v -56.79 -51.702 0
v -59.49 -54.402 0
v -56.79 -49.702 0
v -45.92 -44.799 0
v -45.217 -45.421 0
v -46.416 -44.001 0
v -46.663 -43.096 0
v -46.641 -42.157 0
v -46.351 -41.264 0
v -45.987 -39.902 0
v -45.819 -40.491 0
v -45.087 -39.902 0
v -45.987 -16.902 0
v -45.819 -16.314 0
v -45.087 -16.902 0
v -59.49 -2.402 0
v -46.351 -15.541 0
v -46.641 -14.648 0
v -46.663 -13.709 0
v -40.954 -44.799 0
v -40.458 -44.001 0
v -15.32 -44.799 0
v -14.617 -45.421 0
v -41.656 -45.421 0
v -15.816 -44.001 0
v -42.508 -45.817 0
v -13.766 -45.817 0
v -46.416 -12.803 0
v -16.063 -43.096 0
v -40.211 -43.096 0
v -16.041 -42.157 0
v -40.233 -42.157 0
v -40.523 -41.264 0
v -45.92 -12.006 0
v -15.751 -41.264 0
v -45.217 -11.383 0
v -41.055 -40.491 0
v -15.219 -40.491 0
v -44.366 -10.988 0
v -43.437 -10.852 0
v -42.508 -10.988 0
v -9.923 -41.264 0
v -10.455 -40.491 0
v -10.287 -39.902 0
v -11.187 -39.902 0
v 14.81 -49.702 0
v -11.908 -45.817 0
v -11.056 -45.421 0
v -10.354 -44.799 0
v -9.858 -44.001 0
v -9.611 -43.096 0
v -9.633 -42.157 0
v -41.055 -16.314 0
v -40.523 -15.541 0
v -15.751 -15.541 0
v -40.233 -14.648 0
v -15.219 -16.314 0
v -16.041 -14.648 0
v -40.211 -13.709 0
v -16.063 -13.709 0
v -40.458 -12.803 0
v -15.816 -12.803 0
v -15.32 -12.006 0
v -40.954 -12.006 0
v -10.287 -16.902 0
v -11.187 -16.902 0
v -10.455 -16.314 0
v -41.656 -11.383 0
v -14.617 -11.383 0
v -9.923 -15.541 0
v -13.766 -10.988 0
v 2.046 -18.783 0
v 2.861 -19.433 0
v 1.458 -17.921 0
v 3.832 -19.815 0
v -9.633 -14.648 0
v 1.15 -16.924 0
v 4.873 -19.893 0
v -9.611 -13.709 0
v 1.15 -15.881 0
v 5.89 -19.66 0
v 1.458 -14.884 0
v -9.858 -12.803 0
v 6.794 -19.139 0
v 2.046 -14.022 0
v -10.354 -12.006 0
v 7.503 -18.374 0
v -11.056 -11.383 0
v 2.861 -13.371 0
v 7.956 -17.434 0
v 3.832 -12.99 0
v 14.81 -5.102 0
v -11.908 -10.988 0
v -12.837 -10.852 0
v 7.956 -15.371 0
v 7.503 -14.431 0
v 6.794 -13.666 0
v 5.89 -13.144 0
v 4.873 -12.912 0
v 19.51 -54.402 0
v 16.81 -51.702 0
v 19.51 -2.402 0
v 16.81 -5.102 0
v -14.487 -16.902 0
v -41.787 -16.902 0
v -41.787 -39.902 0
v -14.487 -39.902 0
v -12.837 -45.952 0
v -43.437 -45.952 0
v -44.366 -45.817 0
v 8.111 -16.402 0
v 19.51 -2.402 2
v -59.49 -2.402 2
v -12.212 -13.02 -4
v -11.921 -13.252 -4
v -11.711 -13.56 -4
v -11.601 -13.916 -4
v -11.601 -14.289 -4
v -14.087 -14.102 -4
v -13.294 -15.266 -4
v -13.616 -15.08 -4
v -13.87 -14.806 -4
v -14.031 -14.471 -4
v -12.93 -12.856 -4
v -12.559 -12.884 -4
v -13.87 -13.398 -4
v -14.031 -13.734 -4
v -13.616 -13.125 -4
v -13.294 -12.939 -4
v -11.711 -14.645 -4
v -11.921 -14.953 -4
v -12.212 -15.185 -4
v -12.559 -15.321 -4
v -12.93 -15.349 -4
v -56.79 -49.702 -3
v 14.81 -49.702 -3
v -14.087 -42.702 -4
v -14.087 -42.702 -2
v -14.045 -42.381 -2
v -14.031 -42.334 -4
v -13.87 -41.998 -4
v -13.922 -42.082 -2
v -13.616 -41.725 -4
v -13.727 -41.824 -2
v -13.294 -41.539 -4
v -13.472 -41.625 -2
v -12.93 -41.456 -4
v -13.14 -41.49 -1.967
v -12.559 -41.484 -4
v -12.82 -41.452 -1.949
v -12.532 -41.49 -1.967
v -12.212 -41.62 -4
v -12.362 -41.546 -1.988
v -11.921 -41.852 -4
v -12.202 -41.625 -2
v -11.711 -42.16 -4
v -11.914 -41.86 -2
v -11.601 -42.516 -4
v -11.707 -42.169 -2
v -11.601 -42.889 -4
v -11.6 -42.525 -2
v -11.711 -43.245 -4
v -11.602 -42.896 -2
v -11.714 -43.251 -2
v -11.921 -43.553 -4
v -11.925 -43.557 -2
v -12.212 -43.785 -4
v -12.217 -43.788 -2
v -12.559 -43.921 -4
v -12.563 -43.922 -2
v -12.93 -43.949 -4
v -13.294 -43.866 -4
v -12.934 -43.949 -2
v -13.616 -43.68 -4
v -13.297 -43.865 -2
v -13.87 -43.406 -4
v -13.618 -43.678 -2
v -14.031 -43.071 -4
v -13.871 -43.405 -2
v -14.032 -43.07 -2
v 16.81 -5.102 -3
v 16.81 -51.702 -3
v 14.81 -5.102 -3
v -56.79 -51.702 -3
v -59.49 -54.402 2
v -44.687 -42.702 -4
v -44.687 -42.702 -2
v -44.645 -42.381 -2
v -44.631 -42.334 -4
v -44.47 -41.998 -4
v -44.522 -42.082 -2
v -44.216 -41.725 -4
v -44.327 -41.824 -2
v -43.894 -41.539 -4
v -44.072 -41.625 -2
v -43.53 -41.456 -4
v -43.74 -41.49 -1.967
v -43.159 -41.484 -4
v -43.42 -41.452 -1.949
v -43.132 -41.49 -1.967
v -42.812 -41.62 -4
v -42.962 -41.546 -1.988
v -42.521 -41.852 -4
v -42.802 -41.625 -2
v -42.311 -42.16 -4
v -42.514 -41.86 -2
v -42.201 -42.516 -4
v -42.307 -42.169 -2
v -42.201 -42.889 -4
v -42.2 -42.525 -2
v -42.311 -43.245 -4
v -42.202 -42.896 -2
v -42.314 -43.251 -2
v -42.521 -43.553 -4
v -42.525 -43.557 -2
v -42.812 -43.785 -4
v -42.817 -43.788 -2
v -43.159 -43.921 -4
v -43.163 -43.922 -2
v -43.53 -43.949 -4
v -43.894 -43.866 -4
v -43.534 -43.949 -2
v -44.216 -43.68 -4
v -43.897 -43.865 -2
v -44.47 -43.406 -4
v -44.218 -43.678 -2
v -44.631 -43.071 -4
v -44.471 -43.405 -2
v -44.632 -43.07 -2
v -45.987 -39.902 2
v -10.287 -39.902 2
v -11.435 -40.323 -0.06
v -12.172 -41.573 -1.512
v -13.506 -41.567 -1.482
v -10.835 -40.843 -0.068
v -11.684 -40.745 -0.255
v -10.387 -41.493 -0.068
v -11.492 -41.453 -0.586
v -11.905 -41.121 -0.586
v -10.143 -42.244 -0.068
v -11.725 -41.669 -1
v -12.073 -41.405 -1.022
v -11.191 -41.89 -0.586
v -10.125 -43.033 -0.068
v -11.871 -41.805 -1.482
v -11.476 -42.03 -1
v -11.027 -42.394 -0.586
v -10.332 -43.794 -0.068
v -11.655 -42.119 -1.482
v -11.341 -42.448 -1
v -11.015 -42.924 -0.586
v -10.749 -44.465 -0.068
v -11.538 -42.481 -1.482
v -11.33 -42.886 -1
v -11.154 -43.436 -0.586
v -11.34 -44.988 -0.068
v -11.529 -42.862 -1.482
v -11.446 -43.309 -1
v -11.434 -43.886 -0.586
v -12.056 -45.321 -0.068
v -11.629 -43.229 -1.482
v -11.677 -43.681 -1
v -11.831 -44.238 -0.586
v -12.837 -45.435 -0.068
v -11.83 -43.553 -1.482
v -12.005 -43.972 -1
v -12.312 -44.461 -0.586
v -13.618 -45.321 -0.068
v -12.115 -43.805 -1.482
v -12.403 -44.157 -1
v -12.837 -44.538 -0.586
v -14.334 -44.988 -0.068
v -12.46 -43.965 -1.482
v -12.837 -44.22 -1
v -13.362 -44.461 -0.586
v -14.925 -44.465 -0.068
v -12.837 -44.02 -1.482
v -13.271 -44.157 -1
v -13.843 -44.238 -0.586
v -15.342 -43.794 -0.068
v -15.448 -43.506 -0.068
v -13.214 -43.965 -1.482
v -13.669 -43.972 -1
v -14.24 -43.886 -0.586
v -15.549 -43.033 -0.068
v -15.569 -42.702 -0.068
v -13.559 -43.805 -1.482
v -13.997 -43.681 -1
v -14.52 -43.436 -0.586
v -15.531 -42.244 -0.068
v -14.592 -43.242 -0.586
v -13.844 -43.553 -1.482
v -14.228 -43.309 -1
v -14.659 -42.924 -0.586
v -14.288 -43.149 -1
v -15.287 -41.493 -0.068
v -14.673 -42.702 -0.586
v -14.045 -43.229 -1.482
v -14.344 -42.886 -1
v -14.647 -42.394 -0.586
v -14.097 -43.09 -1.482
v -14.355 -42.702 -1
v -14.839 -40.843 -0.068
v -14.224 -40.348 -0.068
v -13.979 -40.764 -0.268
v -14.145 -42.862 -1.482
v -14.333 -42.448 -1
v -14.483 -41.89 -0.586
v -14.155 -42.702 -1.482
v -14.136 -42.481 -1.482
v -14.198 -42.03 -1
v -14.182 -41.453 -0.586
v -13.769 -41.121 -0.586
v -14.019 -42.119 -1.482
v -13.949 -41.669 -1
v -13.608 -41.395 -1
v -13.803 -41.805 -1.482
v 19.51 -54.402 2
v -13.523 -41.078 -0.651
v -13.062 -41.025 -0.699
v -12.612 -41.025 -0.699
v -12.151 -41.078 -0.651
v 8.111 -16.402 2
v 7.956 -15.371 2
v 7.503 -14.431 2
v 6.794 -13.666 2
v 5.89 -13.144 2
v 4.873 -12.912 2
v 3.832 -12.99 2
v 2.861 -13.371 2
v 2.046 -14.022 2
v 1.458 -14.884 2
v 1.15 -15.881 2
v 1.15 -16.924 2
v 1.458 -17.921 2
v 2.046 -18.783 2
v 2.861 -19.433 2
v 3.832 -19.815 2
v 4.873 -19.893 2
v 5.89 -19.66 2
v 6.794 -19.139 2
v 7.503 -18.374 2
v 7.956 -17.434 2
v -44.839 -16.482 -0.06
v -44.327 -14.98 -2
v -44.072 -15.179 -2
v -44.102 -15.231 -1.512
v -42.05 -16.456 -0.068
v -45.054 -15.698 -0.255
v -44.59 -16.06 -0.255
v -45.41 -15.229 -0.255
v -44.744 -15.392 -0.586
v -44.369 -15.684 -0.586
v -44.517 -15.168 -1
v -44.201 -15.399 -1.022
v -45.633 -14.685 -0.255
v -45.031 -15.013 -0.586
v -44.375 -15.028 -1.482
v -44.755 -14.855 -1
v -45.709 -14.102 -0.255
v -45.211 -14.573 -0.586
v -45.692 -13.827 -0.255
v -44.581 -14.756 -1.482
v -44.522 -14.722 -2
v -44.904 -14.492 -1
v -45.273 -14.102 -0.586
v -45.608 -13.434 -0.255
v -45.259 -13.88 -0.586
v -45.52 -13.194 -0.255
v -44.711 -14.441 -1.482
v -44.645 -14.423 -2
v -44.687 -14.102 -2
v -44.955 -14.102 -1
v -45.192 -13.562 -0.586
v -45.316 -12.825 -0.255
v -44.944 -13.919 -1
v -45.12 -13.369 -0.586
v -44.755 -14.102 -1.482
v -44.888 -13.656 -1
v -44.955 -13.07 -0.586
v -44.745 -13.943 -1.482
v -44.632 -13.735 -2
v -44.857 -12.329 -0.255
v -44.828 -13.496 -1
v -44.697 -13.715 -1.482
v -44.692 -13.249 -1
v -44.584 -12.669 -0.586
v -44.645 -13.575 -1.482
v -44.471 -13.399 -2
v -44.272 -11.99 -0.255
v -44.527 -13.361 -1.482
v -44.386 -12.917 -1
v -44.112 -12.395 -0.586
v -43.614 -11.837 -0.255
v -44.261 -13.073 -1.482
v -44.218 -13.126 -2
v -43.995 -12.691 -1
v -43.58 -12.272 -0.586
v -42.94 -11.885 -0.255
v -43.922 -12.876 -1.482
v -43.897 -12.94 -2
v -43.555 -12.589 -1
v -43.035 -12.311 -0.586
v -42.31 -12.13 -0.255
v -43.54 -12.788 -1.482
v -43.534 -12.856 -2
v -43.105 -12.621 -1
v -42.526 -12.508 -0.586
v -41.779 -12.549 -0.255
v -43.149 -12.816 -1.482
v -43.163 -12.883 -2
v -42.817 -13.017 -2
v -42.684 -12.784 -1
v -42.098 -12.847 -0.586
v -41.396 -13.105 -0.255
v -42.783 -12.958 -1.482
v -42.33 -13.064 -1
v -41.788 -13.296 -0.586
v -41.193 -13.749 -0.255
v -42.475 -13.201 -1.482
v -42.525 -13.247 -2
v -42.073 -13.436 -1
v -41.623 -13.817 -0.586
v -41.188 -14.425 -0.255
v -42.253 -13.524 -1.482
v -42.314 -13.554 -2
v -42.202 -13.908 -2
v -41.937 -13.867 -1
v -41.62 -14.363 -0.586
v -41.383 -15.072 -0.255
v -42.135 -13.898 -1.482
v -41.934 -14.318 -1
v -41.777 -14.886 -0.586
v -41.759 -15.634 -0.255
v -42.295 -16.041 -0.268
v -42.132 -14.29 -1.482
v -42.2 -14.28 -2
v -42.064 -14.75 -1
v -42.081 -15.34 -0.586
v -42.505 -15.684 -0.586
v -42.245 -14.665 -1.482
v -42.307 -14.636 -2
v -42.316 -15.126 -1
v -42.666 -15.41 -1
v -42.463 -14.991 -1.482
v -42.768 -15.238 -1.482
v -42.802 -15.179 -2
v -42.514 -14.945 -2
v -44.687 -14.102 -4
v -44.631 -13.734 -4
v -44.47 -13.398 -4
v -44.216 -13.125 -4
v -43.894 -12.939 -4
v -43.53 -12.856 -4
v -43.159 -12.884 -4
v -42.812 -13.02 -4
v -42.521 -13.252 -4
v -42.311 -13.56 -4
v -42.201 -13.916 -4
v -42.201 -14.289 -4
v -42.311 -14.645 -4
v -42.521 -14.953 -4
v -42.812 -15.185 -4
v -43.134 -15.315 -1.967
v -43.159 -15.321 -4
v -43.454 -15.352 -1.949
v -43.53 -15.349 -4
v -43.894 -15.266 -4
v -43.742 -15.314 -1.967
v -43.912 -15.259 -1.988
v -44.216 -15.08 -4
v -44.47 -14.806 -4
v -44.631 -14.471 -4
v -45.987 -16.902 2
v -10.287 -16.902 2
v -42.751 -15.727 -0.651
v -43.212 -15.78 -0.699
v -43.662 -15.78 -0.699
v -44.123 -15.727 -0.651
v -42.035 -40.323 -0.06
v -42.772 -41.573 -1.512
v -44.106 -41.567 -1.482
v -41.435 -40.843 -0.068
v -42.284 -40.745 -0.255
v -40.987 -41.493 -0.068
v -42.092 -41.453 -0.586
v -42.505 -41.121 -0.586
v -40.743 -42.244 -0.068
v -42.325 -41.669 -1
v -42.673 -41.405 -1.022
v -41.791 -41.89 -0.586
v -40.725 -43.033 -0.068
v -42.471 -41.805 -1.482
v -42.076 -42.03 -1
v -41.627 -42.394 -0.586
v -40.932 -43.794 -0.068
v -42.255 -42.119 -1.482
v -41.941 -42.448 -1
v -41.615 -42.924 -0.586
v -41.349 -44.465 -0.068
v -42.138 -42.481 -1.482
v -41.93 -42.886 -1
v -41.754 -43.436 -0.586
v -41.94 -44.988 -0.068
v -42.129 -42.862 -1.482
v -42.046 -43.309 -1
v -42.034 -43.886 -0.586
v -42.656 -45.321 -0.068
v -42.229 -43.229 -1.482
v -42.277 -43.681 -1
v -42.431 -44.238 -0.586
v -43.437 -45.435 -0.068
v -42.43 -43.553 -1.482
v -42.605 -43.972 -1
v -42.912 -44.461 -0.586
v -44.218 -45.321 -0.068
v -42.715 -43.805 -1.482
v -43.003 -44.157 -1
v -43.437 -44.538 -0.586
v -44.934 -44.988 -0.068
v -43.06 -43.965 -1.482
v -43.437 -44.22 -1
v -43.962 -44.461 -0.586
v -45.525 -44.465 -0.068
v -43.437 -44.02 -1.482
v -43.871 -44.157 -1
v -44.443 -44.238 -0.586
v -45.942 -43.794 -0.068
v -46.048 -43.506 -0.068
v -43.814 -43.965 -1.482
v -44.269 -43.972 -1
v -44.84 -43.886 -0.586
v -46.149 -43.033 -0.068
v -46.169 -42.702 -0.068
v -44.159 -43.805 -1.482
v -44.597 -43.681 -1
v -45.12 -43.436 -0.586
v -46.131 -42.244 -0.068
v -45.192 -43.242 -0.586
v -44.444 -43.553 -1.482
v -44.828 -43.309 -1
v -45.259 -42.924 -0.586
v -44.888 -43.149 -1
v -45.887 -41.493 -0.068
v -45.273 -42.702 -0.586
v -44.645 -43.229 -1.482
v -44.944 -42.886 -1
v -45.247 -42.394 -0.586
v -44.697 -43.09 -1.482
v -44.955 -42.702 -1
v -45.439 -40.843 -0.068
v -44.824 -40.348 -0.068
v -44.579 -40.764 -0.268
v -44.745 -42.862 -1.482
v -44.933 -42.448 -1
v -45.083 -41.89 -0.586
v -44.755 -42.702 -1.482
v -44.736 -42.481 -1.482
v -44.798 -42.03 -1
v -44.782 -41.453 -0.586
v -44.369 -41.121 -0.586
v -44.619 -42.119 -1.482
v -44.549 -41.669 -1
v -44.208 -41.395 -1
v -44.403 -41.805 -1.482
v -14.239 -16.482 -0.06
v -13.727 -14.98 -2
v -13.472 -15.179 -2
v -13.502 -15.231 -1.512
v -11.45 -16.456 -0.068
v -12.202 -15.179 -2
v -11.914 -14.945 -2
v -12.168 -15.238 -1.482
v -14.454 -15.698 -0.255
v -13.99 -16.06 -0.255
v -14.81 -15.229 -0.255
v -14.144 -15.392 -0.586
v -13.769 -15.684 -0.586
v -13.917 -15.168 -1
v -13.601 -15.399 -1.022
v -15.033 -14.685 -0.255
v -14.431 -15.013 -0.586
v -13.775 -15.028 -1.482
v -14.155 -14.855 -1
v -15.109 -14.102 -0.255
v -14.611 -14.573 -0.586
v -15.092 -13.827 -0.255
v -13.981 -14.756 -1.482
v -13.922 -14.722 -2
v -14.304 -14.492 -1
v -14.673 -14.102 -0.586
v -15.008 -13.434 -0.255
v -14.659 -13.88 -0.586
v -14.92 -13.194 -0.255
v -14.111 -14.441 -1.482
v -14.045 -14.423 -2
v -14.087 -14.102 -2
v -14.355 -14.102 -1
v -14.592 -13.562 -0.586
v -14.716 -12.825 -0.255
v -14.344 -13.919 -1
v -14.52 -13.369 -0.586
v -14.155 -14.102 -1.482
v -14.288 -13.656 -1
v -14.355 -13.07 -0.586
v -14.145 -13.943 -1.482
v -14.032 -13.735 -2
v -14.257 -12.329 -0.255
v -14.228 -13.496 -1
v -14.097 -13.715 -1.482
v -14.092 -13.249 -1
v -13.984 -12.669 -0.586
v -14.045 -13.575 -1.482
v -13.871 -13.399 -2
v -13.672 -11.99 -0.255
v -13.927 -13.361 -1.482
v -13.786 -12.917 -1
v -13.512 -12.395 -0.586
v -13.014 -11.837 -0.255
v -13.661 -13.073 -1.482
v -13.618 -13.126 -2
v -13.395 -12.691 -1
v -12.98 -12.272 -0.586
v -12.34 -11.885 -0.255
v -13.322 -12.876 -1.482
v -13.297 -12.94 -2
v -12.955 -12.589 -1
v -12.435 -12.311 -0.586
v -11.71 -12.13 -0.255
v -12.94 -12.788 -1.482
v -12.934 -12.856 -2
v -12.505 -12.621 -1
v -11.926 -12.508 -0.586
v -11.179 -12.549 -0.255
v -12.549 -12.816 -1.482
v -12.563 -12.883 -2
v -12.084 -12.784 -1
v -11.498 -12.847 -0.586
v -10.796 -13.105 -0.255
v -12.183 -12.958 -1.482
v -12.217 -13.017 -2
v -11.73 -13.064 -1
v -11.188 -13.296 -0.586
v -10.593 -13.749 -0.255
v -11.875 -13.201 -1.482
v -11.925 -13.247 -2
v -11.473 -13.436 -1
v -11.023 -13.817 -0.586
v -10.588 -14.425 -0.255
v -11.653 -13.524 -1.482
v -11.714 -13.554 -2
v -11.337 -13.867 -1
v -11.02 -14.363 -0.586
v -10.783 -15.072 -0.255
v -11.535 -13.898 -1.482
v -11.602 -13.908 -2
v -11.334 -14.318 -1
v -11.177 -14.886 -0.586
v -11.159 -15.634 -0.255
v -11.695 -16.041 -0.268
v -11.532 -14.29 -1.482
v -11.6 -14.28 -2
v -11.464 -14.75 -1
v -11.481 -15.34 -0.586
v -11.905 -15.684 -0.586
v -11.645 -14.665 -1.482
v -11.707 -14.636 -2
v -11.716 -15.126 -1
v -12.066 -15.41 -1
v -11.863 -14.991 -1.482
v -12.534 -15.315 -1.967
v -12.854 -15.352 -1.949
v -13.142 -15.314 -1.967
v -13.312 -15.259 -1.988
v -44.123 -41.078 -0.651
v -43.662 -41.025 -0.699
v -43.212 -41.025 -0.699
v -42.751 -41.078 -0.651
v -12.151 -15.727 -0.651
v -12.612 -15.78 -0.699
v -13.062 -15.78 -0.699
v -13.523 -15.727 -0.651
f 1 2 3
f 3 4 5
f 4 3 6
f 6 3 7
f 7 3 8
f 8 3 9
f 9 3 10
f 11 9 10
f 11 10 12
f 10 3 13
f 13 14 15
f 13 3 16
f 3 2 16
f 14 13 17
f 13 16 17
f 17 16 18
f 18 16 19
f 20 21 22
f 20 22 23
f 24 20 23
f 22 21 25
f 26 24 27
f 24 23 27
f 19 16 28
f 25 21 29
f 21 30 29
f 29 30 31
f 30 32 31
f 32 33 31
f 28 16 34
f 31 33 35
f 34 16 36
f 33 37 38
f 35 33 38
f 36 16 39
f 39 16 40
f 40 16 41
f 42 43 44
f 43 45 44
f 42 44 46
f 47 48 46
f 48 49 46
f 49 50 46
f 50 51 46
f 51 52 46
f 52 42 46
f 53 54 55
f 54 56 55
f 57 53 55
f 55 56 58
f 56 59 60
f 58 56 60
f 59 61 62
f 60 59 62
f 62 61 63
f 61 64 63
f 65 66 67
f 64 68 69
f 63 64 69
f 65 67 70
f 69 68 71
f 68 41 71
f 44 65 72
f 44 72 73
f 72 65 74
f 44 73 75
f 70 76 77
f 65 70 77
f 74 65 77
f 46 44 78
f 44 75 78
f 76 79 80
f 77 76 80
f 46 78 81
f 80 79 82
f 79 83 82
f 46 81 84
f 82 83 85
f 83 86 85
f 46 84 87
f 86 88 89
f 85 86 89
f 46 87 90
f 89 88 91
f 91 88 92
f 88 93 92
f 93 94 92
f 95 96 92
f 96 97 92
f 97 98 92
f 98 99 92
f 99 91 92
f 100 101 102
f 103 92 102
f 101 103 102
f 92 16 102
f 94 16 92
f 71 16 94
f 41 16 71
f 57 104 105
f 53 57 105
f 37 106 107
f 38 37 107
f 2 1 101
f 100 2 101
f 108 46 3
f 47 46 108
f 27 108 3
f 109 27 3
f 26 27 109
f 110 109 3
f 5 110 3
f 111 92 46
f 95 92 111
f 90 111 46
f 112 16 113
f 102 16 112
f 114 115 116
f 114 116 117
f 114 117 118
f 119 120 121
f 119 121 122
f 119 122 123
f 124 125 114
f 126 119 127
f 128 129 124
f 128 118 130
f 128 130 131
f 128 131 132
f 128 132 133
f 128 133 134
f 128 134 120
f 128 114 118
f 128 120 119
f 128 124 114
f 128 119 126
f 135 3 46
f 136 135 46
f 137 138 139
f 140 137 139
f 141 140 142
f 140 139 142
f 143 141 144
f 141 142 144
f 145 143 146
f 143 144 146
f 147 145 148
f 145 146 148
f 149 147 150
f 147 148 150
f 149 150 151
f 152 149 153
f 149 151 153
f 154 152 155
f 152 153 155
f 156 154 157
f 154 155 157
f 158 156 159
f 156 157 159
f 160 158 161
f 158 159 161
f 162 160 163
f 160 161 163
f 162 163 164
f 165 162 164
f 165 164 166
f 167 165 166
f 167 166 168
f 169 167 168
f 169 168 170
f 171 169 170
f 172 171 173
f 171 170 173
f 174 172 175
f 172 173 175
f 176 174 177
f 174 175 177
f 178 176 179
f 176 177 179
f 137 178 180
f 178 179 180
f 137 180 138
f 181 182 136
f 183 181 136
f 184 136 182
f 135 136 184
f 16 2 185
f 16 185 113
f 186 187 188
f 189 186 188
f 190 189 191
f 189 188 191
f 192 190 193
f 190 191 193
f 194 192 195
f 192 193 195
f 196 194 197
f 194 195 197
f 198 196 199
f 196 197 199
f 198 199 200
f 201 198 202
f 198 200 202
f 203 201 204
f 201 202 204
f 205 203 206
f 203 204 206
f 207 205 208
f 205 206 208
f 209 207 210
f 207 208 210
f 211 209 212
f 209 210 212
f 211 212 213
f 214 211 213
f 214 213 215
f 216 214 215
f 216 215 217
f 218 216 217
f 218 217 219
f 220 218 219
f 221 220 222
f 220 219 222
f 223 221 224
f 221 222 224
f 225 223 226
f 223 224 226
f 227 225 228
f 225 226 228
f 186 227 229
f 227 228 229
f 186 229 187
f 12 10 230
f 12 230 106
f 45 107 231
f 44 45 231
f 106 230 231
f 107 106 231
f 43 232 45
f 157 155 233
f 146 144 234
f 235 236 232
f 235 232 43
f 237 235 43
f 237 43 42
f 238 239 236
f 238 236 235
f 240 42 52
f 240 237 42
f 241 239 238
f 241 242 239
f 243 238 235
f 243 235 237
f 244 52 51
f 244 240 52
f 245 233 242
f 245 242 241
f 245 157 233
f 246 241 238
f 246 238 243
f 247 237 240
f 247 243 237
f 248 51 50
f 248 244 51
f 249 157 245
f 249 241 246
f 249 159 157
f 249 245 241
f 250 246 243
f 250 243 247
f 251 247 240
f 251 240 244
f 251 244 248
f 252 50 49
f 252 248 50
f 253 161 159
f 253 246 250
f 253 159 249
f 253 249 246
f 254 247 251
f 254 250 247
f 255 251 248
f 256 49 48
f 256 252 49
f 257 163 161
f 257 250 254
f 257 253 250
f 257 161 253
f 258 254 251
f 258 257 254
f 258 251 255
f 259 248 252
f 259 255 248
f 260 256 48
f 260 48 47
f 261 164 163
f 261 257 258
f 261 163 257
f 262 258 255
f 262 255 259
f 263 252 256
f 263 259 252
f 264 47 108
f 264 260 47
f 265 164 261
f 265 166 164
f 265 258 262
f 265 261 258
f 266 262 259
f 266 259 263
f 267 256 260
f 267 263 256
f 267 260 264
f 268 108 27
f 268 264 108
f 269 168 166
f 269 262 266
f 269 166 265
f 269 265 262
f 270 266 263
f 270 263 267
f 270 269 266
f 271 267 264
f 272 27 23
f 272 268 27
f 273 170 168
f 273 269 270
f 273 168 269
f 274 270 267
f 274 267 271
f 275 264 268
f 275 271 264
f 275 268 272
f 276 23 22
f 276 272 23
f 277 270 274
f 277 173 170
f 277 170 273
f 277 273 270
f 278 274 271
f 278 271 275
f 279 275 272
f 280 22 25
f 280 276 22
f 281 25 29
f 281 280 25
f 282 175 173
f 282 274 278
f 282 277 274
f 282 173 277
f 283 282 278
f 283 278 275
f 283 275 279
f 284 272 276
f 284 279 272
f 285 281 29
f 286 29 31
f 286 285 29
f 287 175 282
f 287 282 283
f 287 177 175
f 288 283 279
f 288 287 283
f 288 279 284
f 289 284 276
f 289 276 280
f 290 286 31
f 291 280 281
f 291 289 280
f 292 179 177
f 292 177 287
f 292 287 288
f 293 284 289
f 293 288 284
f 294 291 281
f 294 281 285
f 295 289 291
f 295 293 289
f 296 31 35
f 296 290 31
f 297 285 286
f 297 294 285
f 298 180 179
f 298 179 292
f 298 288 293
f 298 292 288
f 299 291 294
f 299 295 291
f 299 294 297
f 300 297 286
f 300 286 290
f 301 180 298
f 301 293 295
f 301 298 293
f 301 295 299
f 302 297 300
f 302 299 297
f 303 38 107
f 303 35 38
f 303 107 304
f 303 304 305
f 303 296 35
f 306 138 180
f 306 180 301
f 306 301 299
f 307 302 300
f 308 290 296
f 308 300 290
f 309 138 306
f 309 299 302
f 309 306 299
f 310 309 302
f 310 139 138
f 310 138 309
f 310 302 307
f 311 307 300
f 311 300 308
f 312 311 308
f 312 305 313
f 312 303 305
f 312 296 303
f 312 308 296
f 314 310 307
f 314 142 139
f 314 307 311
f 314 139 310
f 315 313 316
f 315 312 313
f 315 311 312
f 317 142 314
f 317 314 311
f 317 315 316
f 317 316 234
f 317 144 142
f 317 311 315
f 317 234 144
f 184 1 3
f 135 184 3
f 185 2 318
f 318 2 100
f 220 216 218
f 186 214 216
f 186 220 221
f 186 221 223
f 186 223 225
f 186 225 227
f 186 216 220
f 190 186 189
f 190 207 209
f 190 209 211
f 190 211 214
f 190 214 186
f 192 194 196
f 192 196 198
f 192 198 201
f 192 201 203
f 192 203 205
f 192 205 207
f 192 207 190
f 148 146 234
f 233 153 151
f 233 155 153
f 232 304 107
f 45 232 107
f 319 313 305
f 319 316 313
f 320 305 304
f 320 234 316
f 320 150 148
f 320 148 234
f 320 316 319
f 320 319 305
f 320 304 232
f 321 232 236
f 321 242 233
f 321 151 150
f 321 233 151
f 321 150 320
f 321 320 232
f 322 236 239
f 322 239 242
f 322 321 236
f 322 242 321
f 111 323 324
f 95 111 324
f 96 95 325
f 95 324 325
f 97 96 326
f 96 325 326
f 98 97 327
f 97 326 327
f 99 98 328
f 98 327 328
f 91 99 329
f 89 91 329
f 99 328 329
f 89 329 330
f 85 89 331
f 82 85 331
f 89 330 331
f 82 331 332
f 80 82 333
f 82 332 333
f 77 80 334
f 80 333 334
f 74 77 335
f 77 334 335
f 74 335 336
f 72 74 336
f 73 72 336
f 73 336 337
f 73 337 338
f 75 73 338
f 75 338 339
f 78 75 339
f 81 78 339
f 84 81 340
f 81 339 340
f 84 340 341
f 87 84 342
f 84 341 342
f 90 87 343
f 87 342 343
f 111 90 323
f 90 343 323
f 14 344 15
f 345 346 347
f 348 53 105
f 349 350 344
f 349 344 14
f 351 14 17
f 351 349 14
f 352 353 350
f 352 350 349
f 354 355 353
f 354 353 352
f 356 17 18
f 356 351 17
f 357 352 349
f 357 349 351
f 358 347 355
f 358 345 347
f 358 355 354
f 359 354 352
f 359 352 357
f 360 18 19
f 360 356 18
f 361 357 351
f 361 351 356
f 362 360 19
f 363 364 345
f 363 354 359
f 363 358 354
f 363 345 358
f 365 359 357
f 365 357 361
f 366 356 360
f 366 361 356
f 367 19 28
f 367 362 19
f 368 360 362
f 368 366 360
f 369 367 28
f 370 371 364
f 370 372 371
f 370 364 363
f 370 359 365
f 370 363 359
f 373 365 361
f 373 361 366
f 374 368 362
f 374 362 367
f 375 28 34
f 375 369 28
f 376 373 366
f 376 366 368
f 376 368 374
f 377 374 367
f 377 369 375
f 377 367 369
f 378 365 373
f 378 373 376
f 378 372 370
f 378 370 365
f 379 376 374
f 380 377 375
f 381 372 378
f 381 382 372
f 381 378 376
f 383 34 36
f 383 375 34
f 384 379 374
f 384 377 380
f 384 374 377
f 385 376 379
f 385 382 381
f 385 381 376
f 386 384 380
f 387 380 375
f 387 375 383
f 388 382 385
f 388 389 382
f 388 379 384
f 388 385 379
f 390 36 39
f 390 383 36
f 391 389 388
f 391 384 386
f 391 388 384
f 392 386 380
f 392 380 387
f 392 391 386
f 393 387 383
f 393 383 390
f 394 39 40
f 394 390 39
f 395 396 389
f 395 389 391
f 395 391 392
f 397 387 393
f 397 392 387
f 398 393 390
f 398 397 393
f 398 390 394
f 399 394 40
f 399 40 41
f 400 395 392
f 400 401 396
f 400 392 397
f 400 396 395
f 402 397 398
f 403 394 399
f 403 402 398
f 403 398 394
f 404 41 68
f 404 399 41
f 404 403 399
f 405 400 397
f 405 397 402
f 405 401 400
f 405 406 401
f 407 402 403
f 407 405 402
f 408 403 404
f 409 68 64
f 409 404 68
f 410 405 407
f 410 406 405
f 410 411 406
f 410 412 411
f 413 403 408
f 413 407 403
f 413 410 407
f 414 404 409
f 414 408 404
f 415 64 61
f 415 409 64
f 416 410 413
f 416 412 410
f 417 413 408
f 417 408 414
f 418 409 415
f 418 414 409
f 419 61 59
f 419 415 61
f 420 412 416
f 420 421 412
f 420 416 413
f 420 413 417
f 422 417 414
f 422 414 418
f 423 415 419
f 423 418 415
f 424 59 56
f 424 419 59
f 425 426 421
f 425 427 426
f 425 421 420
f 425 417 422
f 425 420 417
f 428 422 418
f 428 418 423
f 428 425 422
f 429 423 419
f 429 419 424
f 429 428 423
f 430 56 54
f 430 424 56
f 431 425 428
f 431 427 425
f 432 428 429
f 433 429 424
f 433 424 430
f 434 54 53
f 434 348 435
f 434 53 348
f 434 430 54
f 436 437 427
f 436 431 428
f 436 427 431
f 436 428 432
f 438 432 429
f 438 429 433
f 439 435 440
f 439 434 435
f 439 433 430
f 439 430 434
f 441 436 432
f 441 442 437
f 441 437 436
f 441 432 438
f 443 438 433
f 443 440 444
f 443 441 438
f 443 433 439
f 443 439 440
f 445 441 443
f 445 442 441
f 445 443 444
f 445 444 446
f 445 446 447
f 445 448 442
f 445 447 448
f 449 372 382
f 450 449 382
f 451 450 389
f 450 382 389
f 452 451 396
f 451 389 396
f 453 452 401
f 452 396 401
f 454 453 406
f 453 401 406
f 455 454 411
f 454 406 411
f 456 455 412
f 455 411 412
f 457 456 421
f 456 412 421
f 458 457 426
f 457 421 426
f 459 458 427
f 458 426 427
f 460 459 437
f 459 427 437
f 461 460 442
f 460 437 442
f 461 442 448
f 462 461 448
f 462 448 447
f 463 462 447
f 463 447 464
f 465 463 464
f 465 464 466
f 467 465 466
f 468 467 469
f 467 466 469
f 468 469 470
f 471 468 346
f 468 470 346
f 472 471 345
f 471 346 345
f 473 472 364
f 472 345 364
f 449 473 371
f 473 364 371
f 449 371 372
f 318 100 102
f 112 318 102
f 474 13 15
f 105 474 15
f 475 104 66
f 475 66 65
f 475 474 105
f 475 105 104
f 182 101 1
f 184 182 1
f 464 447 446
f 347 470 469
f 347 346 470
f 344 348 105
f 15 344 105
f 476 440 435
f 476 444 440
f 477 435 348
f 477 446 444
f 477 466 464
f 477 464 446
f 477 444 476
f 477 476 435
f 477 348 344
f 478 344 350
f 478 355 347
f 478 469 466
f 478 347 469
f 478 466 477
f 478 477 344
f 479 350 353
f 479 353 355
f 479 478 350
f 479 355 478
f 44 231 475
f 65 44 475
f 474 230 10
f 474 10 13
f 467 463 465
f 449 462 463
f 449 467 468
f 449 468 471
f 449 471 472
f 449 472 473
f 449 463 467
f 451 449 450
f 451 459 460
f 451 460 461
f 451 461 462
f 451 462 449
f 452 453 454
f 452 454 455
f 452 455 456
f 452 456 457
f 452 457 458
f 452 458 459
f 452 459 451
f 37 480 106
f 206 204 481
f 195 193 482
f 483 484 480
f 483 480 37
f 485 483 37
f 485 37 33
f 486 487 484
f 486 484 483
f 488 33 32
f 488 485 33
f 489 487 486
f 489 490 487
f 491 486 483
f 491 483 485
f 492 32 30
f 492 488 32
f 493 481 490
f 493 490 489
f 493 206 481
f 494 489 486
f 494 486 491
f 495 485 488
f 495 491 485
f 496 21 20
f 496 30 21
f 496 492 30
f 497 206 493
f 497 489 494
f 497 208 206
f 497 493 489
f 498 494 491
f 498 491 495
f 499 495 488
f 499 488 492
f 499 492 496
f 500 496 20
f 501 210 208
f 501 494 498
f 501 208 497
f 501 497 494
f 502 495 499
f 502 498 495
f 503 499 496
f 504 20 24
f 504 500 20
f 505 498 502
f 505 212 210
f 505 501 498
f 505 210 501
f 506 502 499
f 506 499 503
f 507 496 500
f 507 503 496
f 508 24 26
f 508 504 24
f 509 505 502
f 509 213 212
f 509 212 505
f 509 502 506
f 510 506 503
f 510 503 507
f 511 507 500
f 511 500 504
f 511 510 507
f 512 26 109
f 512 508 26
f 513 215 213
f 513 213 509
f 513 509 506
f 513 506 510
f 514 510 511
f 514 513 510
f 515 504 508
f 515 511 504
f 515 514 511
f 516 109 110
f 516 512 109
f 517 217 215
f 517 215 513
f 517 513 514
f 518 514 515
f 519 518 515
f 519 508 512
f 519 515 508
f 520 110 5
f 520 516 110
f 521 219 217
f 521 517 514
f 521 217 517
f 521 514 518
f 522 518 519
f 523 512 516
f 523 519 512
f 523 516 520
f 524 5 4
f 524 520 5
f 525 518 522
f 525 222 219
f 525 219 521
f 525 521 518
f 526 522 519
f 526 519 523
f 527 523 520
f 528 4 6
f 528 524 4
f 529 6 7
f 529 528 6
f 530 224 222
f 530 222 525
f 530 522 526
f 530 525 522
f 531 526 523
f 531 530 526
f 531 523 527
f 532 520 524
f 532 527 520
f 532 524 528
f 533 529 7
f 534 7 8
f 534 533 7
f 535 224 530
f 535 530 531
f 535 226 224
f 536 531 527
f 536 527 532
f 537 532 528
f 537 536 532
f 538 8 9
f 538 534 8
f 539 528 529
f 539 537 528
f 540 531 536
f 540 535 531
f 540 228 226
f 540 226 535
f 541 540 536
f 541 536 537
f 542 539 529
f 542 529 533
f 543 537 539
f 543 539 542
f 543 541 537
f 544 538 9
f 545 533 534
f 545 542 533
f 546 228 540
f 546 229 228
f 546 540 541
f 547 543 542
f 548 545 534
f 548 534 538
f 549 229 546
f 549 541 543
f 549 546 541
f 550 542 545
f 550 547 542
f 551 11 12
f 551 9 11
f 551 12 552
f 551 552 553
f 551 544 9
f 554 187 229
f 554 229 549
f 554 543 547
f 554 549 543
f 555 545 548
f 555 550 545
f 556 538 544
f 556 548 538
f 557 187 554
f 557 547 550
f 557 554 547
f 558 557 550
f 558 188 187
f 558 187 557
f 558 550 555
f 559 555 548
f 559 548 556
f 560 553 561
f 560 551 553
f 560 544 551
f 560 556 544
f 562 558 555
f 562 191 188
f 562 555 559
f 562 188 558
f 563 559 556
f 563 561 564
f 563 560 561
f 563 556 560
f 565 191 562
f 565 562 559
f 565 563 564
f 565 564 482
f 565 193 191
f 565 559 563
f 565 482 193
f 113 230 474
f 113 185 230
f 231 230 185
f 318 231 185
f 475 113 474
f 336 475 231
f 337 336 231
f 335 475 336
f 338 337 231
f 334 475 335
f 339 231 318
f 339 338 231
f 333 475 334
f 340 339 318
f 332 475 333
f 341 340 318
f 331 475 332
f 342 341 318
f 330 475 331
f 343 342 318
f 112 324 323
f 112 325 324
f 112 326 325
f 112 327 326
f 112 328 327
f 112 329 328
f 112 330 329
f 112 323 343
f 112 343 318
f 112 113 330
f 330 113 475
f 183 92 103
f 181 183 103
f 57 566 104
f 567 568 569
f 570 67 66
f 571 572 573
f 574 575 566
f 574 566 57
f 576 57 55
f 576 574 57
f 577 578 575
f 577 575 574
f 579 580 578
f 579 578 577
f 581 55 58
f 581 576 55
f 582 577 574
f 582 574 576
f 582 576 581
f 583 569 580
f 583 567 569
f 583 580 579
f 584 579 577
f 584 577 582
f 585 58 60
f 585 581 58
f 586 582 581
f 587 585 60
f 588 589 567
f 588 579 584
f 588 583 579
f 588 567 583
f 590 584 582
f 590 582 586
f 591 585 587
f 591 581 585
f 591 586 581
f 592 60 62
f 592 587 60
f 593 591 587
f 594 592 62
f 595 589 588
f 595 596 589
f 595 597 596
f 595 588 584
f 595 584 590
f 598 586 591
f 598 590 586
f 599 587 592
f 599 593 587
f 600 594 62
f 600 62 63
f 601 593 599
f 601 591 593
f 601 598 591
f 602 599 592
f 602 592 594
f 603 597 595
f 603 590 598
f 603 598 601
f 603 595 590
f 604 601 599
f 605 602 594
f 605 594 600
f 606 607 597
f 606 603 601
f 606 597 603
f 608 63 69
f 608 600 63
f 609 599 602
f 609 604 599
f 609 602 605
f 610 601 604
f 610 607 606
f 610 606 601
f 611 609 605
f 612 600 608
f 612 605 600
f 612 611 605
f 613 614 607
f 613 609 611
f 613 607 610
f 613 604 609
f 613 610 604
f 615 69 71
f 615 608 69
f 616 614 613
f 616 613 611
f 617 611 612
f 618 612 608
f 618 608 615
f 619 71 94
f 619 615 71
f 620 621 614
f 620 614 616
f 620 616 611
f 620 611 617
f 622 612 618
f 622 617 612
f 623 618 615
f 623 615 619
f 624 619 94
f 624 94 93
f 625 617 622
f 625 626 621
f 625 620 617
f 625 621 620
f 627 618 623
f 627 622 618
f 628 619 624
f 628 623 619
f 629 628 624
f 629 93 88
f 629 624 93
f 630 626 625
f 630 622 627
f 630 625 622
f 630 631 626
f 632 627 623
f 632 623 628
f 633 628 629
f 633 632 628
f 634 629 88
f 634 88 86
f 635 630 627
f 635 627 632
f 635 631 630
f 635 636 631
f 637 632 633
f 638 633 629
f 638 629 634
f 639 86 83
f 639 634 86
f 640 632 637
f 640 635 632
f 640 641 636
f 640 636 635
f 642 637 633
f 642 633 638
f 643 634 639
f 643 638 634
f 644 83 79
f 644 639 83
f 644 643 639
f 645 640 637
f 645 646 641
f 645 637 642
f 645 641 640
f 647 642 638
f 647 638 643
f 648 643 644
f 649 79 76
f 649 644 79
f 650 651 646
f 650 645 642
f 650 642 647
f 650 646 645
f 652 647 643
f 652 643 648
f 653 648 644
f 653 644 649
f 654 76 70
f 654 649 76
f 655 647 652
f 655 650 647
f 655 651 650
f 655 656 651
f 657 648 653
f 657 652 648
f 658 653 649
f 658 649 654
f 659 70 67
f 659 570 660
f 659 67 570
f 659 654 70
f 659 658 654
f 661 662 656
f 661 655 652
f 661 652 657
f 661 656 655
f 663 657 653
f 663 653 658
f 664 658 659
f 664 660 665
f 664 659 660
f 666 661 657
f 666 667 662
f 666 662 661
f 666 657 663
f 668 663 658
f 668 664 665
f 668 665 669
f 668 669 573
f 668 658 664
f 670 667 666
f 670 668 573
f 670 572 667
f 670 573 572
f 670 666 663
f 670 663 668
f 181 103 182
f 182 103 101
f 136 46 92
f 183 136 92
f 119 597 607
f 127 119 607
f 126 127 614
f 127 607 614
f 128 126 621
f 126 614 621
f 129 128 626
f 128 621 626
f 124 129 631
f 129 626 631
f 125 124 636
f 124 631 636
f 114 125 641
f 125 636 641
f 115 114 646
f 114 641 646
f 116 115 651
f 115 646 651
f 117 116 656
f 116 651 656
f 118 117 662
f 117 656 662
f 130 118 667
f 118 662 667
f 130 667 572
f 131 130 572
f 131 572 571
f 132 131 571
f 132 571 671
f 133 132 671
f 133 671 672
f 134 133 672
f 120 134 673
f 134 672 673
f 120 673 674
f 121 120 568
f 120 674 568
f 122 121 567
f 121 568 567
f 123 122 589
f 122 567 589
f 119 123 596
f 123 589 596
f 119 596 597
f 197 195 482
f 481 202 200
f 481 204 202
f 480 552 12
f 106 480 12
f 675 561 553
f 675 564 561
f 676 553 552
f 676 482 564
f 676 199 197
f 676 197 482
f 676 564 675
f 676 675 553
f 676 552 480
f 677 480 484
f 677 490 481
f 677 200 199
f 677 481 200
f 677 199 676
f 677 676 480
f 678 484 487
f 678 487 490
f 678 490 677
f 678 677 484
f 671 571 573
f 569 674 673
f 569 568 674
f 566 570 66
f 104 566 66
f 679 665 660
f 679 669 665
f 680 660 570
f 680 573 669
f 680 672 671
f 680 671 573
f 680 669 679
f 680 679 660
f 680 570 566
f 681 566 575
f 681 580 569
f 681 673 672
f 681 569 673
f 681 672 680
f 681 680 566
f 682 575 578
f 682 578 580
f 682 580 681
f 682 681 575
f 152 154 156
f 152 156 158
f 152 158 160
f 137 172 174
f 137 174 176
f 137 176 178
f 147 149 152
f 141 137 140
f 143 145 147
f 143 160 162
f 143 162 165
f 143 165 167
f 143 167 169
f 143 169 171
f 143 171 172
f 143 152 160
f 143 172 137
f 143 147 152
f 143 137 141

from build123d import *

# Parameters (mm, degrees)
SKIZZE10_W                       = 79
SKIZZE10_H                       = 52
AUFSATZ_LINEAR_AUSTRAGEN8_DEPTH  = 2
SKIZZE11_W                       = 35.7
SKIZZE11_H                       = 23
SCHNITT_LINEAR_AUSTRAGEN3_DEPTH  = 2
SKIZZE13_R                       = 3.5
SCHNITT_LINEAR_AUSTRAGEN4_DEPTH  = 2
SKIZZE14_R                       = 1.25
AUFSATZ_LINEAR_AUSTRAGEN9_DEPTH  = 4
AUFSATZ_LINEAR_AUSTRAGEN10_DEPTH = 3
VERRUNDUNG1_R                    = 2


with BuildPart() as part:
    # Skizze10 → Aufsatz-Linear austragen8 (new body)
    with BuildSketch(Plane.XY):
        with Locations((-19.990421456, -28.402298851)):
            Rectangle(SKIZZE10_W, SKIZZE10_H)
    extrude(amount=AUFSATZ_LINEAR_AUSTRAGEN8_DEPTH)

    # Skizze11 → Schnitt-Linear austragen3 (cut)
    with BuildSketch(Plane.XY.offset(2)):
        with Locations((-28.136972684, -28.402298851)):
            Rectangle(SKIZZE11_W, SKIZZE11_H)
    extrude(amount=-SCHNITT_LINEAR_AUSTRAGEN3_DEPTH, mode=Mode.SUBTRACT)

    # Skizze13 → Schnitt-Linear austragen4 (cut)
    with BuildSketch(Plane.XY.offset(2)):
        with Locations((4.61130293, -16.402298851)):
            Circle(SKIZZE13_R)
    extrude(amount=-SCHNITT_LINEAR_AUSTRAGEN4_DEPTH, mode=Mode.SUBTRACT)

    # Skizze14 → Aufsatz-Linear austragen9 (add)
    with BuildSketch(Plane(origin=(0, 0, 0), x_dir=(-1, 0, 0), z_dir=(0, 0, -1))):
        with Locations((43.436972684, -14.102298851)):
            Circle(SKIZZE14_R)
        with Locations((43.436972684, -42.702298851)):
            Circle(SKIZZE14_R)
        with Locations((12.836972684, -14.102298851)):
            Circle(SKIZZE14_R)
        with Locations((12.836972684, -42.702298851)):
            Circle(SKIZZE14_R)
    extrude(amount=AUFSATZ_LINEAR_AUSTRAGEN9_DEPTH)

    # Skizze15 → Aufsatz-Linear austragen10 (add)
    with BuildSketch(Plane(origin=(0, 0, 0), x_dir=(-1, 0, 0), z_dir=(0, 0, -1))):
        Polygon((-16.809578544, -5.102298851), (-16.809578544, -51.702298851), (56.790421456, -51.702298851), (56.790421456, -49.702298851), (-14.809578544, -49.702298851), (-14.809578544, -5.102298851), align=None)
    extrude(amount=AUFSATZ_LINEAR_AUSTRAGEN10_DEPTH)

    # Verrundung1
    verrundung1_edges = [part.edges().sort_by_distance(p)[0] for p in [
        (-42.186972684, -14.102298851, 0),
        (-42.186972684, -42.702298851, 0),
        (-11.586972684, -14.102298851, 0),
        (-11.586972684, -42.702298851, 0),
    ]]
    fillet(verrundung1_edges, radius=VERRUNDUNG1_R)


solid = part.part
